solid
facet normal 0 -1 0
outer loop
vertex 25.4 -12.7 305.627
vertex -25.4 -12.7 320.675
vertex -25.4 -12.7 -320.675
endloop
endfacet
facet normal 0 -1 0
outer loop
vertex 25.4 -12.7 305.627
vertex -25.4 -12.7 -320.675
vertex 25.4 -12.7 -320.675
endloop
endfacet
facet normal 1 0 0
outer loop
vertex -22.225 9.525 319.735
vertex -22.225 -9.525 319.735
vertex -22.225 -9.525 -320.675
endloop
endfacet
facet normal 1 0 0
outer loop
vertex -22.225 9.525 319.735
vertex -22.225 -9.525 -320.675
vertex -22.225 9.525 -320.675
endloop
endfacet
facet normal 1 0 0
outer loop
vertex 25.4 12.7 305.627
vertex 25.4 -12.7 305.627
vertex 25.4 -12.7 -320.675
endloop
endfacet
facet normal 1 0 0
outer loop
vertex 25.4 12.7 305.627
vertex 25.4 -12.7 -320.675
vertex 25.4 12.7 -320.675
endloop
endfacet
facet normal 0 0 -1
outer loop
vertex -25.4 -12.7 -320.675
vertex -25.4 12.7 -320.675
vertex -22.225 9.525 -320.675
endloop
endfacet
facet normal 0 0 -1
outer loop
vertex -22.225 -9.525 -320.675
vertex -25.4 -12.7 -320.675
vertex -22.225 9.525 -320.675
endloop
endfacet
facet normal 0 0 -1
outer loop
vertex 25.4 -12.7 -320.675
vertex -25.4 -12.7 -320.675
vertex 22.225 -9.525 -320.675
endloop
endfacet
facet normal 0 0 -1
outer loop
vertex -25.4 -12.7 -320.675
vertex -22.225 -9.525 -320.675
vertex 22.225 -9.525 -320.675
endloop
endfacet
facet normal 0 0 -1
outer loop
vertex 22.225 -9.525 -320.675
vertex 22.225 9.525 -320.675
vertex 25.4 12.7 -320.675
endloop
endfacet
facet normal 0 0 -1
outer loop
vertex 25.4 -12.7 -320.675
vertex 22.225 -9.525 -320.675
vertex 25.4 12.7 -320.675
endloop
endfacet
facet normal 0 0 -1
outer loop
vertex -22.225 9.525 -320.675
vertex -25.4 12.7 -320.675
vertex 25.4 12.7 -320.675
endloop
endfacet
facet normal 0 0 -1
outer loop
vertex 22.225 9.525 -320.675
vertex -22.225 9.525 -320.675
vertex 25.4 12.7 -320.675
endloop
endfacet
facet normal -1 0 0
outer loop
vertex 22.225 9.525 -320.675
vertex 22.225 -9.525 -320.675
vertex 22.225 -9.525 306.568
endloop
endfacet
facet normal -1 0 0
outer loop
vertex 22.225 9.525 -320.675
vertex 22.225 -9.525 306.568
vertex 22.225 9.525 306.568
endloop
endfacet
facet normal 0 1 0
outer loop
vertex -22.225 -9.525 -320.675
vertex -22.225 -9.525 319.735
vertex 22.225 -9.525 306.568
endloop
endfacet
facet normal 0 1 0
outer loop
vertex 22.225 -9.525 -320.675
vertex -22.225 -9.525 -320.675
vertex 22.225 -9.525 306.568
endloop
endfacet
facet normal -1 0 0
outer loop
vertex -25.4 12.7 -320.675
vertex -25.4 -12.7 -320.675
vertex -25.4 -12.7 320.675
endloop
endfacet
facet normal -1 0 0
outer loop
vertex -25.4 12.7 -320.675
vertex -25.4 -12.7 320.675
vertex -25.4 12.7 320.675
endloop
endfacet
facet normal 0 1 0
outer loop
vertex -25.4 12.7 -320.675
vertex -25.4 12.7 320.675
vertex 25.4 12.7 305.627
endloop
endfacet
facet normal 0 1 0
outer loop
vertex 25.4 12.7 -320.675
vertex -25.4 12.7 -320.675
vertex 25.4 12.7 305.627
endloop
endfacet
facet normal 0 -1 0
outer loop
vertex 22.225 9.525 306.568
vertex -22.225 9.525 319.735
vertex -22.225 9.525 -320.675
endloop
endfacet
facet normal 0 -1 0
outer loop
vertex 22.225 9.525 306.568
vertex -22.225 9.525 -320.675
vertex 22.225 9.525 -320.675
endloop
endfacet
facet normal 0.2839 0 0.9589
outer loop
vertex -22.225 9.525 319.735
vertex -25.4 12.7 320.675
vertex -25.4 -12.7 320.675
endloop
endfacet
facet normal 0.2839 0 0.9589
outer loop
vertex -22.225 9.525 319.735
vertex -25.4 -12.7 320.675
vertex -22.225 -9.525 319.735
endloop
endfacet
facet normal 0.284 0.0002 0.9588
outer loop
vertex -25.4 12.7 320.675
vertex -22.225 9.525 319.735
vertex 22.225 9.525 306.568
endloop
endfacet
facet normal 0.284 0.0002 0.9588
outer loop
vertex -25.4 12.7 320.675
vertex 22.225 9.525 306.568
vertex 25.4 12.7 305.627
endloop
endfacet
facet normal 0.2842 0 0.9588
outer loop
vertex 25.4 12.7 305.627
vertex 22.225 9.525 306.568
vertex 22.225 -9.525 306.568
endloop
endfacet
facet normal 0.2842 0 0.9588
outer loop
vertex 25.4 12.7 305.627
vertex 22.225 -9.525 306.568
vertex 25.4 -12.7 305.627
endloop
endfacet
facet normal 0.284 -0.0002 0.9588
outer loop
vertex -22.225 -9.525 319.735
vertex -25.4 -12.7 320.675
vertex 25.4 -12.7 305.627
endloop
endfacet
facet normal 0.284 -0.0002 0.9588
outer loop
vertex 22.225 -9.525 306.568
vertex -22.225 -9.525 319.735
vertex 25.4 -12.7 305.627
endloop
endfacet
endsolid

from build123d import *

# Parameters (mm, degrees)
BOSS_EXTRUDE1_DEPTH      = 320.675
BOSS_EXTRUDE1_DEPTH_BACK = 320.675
SKETCH3_W                = 50.8
SKETCH3_H                = 25.4
SKETCH3_W_2              = 44.45
SKETCH3_H_2              = 19.05
CUT_EXTRUDE1_DEPTH       = 323.680609311
CUT_EXTRUDE1_DEPTH_BACK  = 323.680609311


with BuildPart() as part:
    # Sketch3 → Boss-Extrude1 (new, two sides: drawn at the far end of the back side and taken through both)
    with BuildSketch(Plane.XY.offset(-BOSS_EXTRUDE1_DEPTH_BACK)):
        Rectangle(SKETCH3_W, SKETCH3_H)
        Rectangle(SKETCH3_W_2, SKETCH3_H_2, mode=Mode.SUBTRACT)
    extrude(amount=BOSS_EXTRUDE1_DEPTH + BOSS_EXTRUDE1_DEPTH_BACK)

    # Sketch4 → Cut-Extrude1 (cut, two sides: drawn at the far end of the back side and taken through both)
    with BuildSketch(Plane(origin=(0, 12.7, 0), x_dir=(1, 0, 0), z_dir=(0, 1, 0)).offset(-CUT_EXTRUDE1_DEPTH_BACK)):
        Polygon((1322.117470931, -320.675), (25.4, -320.675), (-25.4, -320.675), (25.4, -305.627354456), (1268.718301677, 62.660305034), (3837.350959621, 420.474595165), (3890.750128875, 37.139290131), align=None)
    extrude(amount=CUT_EXTRUDE1_DEPTH + CUT_EXTRUDE1_DEPTH_BACK, mode=Mode.SUBTRACT)


solid = part.part
